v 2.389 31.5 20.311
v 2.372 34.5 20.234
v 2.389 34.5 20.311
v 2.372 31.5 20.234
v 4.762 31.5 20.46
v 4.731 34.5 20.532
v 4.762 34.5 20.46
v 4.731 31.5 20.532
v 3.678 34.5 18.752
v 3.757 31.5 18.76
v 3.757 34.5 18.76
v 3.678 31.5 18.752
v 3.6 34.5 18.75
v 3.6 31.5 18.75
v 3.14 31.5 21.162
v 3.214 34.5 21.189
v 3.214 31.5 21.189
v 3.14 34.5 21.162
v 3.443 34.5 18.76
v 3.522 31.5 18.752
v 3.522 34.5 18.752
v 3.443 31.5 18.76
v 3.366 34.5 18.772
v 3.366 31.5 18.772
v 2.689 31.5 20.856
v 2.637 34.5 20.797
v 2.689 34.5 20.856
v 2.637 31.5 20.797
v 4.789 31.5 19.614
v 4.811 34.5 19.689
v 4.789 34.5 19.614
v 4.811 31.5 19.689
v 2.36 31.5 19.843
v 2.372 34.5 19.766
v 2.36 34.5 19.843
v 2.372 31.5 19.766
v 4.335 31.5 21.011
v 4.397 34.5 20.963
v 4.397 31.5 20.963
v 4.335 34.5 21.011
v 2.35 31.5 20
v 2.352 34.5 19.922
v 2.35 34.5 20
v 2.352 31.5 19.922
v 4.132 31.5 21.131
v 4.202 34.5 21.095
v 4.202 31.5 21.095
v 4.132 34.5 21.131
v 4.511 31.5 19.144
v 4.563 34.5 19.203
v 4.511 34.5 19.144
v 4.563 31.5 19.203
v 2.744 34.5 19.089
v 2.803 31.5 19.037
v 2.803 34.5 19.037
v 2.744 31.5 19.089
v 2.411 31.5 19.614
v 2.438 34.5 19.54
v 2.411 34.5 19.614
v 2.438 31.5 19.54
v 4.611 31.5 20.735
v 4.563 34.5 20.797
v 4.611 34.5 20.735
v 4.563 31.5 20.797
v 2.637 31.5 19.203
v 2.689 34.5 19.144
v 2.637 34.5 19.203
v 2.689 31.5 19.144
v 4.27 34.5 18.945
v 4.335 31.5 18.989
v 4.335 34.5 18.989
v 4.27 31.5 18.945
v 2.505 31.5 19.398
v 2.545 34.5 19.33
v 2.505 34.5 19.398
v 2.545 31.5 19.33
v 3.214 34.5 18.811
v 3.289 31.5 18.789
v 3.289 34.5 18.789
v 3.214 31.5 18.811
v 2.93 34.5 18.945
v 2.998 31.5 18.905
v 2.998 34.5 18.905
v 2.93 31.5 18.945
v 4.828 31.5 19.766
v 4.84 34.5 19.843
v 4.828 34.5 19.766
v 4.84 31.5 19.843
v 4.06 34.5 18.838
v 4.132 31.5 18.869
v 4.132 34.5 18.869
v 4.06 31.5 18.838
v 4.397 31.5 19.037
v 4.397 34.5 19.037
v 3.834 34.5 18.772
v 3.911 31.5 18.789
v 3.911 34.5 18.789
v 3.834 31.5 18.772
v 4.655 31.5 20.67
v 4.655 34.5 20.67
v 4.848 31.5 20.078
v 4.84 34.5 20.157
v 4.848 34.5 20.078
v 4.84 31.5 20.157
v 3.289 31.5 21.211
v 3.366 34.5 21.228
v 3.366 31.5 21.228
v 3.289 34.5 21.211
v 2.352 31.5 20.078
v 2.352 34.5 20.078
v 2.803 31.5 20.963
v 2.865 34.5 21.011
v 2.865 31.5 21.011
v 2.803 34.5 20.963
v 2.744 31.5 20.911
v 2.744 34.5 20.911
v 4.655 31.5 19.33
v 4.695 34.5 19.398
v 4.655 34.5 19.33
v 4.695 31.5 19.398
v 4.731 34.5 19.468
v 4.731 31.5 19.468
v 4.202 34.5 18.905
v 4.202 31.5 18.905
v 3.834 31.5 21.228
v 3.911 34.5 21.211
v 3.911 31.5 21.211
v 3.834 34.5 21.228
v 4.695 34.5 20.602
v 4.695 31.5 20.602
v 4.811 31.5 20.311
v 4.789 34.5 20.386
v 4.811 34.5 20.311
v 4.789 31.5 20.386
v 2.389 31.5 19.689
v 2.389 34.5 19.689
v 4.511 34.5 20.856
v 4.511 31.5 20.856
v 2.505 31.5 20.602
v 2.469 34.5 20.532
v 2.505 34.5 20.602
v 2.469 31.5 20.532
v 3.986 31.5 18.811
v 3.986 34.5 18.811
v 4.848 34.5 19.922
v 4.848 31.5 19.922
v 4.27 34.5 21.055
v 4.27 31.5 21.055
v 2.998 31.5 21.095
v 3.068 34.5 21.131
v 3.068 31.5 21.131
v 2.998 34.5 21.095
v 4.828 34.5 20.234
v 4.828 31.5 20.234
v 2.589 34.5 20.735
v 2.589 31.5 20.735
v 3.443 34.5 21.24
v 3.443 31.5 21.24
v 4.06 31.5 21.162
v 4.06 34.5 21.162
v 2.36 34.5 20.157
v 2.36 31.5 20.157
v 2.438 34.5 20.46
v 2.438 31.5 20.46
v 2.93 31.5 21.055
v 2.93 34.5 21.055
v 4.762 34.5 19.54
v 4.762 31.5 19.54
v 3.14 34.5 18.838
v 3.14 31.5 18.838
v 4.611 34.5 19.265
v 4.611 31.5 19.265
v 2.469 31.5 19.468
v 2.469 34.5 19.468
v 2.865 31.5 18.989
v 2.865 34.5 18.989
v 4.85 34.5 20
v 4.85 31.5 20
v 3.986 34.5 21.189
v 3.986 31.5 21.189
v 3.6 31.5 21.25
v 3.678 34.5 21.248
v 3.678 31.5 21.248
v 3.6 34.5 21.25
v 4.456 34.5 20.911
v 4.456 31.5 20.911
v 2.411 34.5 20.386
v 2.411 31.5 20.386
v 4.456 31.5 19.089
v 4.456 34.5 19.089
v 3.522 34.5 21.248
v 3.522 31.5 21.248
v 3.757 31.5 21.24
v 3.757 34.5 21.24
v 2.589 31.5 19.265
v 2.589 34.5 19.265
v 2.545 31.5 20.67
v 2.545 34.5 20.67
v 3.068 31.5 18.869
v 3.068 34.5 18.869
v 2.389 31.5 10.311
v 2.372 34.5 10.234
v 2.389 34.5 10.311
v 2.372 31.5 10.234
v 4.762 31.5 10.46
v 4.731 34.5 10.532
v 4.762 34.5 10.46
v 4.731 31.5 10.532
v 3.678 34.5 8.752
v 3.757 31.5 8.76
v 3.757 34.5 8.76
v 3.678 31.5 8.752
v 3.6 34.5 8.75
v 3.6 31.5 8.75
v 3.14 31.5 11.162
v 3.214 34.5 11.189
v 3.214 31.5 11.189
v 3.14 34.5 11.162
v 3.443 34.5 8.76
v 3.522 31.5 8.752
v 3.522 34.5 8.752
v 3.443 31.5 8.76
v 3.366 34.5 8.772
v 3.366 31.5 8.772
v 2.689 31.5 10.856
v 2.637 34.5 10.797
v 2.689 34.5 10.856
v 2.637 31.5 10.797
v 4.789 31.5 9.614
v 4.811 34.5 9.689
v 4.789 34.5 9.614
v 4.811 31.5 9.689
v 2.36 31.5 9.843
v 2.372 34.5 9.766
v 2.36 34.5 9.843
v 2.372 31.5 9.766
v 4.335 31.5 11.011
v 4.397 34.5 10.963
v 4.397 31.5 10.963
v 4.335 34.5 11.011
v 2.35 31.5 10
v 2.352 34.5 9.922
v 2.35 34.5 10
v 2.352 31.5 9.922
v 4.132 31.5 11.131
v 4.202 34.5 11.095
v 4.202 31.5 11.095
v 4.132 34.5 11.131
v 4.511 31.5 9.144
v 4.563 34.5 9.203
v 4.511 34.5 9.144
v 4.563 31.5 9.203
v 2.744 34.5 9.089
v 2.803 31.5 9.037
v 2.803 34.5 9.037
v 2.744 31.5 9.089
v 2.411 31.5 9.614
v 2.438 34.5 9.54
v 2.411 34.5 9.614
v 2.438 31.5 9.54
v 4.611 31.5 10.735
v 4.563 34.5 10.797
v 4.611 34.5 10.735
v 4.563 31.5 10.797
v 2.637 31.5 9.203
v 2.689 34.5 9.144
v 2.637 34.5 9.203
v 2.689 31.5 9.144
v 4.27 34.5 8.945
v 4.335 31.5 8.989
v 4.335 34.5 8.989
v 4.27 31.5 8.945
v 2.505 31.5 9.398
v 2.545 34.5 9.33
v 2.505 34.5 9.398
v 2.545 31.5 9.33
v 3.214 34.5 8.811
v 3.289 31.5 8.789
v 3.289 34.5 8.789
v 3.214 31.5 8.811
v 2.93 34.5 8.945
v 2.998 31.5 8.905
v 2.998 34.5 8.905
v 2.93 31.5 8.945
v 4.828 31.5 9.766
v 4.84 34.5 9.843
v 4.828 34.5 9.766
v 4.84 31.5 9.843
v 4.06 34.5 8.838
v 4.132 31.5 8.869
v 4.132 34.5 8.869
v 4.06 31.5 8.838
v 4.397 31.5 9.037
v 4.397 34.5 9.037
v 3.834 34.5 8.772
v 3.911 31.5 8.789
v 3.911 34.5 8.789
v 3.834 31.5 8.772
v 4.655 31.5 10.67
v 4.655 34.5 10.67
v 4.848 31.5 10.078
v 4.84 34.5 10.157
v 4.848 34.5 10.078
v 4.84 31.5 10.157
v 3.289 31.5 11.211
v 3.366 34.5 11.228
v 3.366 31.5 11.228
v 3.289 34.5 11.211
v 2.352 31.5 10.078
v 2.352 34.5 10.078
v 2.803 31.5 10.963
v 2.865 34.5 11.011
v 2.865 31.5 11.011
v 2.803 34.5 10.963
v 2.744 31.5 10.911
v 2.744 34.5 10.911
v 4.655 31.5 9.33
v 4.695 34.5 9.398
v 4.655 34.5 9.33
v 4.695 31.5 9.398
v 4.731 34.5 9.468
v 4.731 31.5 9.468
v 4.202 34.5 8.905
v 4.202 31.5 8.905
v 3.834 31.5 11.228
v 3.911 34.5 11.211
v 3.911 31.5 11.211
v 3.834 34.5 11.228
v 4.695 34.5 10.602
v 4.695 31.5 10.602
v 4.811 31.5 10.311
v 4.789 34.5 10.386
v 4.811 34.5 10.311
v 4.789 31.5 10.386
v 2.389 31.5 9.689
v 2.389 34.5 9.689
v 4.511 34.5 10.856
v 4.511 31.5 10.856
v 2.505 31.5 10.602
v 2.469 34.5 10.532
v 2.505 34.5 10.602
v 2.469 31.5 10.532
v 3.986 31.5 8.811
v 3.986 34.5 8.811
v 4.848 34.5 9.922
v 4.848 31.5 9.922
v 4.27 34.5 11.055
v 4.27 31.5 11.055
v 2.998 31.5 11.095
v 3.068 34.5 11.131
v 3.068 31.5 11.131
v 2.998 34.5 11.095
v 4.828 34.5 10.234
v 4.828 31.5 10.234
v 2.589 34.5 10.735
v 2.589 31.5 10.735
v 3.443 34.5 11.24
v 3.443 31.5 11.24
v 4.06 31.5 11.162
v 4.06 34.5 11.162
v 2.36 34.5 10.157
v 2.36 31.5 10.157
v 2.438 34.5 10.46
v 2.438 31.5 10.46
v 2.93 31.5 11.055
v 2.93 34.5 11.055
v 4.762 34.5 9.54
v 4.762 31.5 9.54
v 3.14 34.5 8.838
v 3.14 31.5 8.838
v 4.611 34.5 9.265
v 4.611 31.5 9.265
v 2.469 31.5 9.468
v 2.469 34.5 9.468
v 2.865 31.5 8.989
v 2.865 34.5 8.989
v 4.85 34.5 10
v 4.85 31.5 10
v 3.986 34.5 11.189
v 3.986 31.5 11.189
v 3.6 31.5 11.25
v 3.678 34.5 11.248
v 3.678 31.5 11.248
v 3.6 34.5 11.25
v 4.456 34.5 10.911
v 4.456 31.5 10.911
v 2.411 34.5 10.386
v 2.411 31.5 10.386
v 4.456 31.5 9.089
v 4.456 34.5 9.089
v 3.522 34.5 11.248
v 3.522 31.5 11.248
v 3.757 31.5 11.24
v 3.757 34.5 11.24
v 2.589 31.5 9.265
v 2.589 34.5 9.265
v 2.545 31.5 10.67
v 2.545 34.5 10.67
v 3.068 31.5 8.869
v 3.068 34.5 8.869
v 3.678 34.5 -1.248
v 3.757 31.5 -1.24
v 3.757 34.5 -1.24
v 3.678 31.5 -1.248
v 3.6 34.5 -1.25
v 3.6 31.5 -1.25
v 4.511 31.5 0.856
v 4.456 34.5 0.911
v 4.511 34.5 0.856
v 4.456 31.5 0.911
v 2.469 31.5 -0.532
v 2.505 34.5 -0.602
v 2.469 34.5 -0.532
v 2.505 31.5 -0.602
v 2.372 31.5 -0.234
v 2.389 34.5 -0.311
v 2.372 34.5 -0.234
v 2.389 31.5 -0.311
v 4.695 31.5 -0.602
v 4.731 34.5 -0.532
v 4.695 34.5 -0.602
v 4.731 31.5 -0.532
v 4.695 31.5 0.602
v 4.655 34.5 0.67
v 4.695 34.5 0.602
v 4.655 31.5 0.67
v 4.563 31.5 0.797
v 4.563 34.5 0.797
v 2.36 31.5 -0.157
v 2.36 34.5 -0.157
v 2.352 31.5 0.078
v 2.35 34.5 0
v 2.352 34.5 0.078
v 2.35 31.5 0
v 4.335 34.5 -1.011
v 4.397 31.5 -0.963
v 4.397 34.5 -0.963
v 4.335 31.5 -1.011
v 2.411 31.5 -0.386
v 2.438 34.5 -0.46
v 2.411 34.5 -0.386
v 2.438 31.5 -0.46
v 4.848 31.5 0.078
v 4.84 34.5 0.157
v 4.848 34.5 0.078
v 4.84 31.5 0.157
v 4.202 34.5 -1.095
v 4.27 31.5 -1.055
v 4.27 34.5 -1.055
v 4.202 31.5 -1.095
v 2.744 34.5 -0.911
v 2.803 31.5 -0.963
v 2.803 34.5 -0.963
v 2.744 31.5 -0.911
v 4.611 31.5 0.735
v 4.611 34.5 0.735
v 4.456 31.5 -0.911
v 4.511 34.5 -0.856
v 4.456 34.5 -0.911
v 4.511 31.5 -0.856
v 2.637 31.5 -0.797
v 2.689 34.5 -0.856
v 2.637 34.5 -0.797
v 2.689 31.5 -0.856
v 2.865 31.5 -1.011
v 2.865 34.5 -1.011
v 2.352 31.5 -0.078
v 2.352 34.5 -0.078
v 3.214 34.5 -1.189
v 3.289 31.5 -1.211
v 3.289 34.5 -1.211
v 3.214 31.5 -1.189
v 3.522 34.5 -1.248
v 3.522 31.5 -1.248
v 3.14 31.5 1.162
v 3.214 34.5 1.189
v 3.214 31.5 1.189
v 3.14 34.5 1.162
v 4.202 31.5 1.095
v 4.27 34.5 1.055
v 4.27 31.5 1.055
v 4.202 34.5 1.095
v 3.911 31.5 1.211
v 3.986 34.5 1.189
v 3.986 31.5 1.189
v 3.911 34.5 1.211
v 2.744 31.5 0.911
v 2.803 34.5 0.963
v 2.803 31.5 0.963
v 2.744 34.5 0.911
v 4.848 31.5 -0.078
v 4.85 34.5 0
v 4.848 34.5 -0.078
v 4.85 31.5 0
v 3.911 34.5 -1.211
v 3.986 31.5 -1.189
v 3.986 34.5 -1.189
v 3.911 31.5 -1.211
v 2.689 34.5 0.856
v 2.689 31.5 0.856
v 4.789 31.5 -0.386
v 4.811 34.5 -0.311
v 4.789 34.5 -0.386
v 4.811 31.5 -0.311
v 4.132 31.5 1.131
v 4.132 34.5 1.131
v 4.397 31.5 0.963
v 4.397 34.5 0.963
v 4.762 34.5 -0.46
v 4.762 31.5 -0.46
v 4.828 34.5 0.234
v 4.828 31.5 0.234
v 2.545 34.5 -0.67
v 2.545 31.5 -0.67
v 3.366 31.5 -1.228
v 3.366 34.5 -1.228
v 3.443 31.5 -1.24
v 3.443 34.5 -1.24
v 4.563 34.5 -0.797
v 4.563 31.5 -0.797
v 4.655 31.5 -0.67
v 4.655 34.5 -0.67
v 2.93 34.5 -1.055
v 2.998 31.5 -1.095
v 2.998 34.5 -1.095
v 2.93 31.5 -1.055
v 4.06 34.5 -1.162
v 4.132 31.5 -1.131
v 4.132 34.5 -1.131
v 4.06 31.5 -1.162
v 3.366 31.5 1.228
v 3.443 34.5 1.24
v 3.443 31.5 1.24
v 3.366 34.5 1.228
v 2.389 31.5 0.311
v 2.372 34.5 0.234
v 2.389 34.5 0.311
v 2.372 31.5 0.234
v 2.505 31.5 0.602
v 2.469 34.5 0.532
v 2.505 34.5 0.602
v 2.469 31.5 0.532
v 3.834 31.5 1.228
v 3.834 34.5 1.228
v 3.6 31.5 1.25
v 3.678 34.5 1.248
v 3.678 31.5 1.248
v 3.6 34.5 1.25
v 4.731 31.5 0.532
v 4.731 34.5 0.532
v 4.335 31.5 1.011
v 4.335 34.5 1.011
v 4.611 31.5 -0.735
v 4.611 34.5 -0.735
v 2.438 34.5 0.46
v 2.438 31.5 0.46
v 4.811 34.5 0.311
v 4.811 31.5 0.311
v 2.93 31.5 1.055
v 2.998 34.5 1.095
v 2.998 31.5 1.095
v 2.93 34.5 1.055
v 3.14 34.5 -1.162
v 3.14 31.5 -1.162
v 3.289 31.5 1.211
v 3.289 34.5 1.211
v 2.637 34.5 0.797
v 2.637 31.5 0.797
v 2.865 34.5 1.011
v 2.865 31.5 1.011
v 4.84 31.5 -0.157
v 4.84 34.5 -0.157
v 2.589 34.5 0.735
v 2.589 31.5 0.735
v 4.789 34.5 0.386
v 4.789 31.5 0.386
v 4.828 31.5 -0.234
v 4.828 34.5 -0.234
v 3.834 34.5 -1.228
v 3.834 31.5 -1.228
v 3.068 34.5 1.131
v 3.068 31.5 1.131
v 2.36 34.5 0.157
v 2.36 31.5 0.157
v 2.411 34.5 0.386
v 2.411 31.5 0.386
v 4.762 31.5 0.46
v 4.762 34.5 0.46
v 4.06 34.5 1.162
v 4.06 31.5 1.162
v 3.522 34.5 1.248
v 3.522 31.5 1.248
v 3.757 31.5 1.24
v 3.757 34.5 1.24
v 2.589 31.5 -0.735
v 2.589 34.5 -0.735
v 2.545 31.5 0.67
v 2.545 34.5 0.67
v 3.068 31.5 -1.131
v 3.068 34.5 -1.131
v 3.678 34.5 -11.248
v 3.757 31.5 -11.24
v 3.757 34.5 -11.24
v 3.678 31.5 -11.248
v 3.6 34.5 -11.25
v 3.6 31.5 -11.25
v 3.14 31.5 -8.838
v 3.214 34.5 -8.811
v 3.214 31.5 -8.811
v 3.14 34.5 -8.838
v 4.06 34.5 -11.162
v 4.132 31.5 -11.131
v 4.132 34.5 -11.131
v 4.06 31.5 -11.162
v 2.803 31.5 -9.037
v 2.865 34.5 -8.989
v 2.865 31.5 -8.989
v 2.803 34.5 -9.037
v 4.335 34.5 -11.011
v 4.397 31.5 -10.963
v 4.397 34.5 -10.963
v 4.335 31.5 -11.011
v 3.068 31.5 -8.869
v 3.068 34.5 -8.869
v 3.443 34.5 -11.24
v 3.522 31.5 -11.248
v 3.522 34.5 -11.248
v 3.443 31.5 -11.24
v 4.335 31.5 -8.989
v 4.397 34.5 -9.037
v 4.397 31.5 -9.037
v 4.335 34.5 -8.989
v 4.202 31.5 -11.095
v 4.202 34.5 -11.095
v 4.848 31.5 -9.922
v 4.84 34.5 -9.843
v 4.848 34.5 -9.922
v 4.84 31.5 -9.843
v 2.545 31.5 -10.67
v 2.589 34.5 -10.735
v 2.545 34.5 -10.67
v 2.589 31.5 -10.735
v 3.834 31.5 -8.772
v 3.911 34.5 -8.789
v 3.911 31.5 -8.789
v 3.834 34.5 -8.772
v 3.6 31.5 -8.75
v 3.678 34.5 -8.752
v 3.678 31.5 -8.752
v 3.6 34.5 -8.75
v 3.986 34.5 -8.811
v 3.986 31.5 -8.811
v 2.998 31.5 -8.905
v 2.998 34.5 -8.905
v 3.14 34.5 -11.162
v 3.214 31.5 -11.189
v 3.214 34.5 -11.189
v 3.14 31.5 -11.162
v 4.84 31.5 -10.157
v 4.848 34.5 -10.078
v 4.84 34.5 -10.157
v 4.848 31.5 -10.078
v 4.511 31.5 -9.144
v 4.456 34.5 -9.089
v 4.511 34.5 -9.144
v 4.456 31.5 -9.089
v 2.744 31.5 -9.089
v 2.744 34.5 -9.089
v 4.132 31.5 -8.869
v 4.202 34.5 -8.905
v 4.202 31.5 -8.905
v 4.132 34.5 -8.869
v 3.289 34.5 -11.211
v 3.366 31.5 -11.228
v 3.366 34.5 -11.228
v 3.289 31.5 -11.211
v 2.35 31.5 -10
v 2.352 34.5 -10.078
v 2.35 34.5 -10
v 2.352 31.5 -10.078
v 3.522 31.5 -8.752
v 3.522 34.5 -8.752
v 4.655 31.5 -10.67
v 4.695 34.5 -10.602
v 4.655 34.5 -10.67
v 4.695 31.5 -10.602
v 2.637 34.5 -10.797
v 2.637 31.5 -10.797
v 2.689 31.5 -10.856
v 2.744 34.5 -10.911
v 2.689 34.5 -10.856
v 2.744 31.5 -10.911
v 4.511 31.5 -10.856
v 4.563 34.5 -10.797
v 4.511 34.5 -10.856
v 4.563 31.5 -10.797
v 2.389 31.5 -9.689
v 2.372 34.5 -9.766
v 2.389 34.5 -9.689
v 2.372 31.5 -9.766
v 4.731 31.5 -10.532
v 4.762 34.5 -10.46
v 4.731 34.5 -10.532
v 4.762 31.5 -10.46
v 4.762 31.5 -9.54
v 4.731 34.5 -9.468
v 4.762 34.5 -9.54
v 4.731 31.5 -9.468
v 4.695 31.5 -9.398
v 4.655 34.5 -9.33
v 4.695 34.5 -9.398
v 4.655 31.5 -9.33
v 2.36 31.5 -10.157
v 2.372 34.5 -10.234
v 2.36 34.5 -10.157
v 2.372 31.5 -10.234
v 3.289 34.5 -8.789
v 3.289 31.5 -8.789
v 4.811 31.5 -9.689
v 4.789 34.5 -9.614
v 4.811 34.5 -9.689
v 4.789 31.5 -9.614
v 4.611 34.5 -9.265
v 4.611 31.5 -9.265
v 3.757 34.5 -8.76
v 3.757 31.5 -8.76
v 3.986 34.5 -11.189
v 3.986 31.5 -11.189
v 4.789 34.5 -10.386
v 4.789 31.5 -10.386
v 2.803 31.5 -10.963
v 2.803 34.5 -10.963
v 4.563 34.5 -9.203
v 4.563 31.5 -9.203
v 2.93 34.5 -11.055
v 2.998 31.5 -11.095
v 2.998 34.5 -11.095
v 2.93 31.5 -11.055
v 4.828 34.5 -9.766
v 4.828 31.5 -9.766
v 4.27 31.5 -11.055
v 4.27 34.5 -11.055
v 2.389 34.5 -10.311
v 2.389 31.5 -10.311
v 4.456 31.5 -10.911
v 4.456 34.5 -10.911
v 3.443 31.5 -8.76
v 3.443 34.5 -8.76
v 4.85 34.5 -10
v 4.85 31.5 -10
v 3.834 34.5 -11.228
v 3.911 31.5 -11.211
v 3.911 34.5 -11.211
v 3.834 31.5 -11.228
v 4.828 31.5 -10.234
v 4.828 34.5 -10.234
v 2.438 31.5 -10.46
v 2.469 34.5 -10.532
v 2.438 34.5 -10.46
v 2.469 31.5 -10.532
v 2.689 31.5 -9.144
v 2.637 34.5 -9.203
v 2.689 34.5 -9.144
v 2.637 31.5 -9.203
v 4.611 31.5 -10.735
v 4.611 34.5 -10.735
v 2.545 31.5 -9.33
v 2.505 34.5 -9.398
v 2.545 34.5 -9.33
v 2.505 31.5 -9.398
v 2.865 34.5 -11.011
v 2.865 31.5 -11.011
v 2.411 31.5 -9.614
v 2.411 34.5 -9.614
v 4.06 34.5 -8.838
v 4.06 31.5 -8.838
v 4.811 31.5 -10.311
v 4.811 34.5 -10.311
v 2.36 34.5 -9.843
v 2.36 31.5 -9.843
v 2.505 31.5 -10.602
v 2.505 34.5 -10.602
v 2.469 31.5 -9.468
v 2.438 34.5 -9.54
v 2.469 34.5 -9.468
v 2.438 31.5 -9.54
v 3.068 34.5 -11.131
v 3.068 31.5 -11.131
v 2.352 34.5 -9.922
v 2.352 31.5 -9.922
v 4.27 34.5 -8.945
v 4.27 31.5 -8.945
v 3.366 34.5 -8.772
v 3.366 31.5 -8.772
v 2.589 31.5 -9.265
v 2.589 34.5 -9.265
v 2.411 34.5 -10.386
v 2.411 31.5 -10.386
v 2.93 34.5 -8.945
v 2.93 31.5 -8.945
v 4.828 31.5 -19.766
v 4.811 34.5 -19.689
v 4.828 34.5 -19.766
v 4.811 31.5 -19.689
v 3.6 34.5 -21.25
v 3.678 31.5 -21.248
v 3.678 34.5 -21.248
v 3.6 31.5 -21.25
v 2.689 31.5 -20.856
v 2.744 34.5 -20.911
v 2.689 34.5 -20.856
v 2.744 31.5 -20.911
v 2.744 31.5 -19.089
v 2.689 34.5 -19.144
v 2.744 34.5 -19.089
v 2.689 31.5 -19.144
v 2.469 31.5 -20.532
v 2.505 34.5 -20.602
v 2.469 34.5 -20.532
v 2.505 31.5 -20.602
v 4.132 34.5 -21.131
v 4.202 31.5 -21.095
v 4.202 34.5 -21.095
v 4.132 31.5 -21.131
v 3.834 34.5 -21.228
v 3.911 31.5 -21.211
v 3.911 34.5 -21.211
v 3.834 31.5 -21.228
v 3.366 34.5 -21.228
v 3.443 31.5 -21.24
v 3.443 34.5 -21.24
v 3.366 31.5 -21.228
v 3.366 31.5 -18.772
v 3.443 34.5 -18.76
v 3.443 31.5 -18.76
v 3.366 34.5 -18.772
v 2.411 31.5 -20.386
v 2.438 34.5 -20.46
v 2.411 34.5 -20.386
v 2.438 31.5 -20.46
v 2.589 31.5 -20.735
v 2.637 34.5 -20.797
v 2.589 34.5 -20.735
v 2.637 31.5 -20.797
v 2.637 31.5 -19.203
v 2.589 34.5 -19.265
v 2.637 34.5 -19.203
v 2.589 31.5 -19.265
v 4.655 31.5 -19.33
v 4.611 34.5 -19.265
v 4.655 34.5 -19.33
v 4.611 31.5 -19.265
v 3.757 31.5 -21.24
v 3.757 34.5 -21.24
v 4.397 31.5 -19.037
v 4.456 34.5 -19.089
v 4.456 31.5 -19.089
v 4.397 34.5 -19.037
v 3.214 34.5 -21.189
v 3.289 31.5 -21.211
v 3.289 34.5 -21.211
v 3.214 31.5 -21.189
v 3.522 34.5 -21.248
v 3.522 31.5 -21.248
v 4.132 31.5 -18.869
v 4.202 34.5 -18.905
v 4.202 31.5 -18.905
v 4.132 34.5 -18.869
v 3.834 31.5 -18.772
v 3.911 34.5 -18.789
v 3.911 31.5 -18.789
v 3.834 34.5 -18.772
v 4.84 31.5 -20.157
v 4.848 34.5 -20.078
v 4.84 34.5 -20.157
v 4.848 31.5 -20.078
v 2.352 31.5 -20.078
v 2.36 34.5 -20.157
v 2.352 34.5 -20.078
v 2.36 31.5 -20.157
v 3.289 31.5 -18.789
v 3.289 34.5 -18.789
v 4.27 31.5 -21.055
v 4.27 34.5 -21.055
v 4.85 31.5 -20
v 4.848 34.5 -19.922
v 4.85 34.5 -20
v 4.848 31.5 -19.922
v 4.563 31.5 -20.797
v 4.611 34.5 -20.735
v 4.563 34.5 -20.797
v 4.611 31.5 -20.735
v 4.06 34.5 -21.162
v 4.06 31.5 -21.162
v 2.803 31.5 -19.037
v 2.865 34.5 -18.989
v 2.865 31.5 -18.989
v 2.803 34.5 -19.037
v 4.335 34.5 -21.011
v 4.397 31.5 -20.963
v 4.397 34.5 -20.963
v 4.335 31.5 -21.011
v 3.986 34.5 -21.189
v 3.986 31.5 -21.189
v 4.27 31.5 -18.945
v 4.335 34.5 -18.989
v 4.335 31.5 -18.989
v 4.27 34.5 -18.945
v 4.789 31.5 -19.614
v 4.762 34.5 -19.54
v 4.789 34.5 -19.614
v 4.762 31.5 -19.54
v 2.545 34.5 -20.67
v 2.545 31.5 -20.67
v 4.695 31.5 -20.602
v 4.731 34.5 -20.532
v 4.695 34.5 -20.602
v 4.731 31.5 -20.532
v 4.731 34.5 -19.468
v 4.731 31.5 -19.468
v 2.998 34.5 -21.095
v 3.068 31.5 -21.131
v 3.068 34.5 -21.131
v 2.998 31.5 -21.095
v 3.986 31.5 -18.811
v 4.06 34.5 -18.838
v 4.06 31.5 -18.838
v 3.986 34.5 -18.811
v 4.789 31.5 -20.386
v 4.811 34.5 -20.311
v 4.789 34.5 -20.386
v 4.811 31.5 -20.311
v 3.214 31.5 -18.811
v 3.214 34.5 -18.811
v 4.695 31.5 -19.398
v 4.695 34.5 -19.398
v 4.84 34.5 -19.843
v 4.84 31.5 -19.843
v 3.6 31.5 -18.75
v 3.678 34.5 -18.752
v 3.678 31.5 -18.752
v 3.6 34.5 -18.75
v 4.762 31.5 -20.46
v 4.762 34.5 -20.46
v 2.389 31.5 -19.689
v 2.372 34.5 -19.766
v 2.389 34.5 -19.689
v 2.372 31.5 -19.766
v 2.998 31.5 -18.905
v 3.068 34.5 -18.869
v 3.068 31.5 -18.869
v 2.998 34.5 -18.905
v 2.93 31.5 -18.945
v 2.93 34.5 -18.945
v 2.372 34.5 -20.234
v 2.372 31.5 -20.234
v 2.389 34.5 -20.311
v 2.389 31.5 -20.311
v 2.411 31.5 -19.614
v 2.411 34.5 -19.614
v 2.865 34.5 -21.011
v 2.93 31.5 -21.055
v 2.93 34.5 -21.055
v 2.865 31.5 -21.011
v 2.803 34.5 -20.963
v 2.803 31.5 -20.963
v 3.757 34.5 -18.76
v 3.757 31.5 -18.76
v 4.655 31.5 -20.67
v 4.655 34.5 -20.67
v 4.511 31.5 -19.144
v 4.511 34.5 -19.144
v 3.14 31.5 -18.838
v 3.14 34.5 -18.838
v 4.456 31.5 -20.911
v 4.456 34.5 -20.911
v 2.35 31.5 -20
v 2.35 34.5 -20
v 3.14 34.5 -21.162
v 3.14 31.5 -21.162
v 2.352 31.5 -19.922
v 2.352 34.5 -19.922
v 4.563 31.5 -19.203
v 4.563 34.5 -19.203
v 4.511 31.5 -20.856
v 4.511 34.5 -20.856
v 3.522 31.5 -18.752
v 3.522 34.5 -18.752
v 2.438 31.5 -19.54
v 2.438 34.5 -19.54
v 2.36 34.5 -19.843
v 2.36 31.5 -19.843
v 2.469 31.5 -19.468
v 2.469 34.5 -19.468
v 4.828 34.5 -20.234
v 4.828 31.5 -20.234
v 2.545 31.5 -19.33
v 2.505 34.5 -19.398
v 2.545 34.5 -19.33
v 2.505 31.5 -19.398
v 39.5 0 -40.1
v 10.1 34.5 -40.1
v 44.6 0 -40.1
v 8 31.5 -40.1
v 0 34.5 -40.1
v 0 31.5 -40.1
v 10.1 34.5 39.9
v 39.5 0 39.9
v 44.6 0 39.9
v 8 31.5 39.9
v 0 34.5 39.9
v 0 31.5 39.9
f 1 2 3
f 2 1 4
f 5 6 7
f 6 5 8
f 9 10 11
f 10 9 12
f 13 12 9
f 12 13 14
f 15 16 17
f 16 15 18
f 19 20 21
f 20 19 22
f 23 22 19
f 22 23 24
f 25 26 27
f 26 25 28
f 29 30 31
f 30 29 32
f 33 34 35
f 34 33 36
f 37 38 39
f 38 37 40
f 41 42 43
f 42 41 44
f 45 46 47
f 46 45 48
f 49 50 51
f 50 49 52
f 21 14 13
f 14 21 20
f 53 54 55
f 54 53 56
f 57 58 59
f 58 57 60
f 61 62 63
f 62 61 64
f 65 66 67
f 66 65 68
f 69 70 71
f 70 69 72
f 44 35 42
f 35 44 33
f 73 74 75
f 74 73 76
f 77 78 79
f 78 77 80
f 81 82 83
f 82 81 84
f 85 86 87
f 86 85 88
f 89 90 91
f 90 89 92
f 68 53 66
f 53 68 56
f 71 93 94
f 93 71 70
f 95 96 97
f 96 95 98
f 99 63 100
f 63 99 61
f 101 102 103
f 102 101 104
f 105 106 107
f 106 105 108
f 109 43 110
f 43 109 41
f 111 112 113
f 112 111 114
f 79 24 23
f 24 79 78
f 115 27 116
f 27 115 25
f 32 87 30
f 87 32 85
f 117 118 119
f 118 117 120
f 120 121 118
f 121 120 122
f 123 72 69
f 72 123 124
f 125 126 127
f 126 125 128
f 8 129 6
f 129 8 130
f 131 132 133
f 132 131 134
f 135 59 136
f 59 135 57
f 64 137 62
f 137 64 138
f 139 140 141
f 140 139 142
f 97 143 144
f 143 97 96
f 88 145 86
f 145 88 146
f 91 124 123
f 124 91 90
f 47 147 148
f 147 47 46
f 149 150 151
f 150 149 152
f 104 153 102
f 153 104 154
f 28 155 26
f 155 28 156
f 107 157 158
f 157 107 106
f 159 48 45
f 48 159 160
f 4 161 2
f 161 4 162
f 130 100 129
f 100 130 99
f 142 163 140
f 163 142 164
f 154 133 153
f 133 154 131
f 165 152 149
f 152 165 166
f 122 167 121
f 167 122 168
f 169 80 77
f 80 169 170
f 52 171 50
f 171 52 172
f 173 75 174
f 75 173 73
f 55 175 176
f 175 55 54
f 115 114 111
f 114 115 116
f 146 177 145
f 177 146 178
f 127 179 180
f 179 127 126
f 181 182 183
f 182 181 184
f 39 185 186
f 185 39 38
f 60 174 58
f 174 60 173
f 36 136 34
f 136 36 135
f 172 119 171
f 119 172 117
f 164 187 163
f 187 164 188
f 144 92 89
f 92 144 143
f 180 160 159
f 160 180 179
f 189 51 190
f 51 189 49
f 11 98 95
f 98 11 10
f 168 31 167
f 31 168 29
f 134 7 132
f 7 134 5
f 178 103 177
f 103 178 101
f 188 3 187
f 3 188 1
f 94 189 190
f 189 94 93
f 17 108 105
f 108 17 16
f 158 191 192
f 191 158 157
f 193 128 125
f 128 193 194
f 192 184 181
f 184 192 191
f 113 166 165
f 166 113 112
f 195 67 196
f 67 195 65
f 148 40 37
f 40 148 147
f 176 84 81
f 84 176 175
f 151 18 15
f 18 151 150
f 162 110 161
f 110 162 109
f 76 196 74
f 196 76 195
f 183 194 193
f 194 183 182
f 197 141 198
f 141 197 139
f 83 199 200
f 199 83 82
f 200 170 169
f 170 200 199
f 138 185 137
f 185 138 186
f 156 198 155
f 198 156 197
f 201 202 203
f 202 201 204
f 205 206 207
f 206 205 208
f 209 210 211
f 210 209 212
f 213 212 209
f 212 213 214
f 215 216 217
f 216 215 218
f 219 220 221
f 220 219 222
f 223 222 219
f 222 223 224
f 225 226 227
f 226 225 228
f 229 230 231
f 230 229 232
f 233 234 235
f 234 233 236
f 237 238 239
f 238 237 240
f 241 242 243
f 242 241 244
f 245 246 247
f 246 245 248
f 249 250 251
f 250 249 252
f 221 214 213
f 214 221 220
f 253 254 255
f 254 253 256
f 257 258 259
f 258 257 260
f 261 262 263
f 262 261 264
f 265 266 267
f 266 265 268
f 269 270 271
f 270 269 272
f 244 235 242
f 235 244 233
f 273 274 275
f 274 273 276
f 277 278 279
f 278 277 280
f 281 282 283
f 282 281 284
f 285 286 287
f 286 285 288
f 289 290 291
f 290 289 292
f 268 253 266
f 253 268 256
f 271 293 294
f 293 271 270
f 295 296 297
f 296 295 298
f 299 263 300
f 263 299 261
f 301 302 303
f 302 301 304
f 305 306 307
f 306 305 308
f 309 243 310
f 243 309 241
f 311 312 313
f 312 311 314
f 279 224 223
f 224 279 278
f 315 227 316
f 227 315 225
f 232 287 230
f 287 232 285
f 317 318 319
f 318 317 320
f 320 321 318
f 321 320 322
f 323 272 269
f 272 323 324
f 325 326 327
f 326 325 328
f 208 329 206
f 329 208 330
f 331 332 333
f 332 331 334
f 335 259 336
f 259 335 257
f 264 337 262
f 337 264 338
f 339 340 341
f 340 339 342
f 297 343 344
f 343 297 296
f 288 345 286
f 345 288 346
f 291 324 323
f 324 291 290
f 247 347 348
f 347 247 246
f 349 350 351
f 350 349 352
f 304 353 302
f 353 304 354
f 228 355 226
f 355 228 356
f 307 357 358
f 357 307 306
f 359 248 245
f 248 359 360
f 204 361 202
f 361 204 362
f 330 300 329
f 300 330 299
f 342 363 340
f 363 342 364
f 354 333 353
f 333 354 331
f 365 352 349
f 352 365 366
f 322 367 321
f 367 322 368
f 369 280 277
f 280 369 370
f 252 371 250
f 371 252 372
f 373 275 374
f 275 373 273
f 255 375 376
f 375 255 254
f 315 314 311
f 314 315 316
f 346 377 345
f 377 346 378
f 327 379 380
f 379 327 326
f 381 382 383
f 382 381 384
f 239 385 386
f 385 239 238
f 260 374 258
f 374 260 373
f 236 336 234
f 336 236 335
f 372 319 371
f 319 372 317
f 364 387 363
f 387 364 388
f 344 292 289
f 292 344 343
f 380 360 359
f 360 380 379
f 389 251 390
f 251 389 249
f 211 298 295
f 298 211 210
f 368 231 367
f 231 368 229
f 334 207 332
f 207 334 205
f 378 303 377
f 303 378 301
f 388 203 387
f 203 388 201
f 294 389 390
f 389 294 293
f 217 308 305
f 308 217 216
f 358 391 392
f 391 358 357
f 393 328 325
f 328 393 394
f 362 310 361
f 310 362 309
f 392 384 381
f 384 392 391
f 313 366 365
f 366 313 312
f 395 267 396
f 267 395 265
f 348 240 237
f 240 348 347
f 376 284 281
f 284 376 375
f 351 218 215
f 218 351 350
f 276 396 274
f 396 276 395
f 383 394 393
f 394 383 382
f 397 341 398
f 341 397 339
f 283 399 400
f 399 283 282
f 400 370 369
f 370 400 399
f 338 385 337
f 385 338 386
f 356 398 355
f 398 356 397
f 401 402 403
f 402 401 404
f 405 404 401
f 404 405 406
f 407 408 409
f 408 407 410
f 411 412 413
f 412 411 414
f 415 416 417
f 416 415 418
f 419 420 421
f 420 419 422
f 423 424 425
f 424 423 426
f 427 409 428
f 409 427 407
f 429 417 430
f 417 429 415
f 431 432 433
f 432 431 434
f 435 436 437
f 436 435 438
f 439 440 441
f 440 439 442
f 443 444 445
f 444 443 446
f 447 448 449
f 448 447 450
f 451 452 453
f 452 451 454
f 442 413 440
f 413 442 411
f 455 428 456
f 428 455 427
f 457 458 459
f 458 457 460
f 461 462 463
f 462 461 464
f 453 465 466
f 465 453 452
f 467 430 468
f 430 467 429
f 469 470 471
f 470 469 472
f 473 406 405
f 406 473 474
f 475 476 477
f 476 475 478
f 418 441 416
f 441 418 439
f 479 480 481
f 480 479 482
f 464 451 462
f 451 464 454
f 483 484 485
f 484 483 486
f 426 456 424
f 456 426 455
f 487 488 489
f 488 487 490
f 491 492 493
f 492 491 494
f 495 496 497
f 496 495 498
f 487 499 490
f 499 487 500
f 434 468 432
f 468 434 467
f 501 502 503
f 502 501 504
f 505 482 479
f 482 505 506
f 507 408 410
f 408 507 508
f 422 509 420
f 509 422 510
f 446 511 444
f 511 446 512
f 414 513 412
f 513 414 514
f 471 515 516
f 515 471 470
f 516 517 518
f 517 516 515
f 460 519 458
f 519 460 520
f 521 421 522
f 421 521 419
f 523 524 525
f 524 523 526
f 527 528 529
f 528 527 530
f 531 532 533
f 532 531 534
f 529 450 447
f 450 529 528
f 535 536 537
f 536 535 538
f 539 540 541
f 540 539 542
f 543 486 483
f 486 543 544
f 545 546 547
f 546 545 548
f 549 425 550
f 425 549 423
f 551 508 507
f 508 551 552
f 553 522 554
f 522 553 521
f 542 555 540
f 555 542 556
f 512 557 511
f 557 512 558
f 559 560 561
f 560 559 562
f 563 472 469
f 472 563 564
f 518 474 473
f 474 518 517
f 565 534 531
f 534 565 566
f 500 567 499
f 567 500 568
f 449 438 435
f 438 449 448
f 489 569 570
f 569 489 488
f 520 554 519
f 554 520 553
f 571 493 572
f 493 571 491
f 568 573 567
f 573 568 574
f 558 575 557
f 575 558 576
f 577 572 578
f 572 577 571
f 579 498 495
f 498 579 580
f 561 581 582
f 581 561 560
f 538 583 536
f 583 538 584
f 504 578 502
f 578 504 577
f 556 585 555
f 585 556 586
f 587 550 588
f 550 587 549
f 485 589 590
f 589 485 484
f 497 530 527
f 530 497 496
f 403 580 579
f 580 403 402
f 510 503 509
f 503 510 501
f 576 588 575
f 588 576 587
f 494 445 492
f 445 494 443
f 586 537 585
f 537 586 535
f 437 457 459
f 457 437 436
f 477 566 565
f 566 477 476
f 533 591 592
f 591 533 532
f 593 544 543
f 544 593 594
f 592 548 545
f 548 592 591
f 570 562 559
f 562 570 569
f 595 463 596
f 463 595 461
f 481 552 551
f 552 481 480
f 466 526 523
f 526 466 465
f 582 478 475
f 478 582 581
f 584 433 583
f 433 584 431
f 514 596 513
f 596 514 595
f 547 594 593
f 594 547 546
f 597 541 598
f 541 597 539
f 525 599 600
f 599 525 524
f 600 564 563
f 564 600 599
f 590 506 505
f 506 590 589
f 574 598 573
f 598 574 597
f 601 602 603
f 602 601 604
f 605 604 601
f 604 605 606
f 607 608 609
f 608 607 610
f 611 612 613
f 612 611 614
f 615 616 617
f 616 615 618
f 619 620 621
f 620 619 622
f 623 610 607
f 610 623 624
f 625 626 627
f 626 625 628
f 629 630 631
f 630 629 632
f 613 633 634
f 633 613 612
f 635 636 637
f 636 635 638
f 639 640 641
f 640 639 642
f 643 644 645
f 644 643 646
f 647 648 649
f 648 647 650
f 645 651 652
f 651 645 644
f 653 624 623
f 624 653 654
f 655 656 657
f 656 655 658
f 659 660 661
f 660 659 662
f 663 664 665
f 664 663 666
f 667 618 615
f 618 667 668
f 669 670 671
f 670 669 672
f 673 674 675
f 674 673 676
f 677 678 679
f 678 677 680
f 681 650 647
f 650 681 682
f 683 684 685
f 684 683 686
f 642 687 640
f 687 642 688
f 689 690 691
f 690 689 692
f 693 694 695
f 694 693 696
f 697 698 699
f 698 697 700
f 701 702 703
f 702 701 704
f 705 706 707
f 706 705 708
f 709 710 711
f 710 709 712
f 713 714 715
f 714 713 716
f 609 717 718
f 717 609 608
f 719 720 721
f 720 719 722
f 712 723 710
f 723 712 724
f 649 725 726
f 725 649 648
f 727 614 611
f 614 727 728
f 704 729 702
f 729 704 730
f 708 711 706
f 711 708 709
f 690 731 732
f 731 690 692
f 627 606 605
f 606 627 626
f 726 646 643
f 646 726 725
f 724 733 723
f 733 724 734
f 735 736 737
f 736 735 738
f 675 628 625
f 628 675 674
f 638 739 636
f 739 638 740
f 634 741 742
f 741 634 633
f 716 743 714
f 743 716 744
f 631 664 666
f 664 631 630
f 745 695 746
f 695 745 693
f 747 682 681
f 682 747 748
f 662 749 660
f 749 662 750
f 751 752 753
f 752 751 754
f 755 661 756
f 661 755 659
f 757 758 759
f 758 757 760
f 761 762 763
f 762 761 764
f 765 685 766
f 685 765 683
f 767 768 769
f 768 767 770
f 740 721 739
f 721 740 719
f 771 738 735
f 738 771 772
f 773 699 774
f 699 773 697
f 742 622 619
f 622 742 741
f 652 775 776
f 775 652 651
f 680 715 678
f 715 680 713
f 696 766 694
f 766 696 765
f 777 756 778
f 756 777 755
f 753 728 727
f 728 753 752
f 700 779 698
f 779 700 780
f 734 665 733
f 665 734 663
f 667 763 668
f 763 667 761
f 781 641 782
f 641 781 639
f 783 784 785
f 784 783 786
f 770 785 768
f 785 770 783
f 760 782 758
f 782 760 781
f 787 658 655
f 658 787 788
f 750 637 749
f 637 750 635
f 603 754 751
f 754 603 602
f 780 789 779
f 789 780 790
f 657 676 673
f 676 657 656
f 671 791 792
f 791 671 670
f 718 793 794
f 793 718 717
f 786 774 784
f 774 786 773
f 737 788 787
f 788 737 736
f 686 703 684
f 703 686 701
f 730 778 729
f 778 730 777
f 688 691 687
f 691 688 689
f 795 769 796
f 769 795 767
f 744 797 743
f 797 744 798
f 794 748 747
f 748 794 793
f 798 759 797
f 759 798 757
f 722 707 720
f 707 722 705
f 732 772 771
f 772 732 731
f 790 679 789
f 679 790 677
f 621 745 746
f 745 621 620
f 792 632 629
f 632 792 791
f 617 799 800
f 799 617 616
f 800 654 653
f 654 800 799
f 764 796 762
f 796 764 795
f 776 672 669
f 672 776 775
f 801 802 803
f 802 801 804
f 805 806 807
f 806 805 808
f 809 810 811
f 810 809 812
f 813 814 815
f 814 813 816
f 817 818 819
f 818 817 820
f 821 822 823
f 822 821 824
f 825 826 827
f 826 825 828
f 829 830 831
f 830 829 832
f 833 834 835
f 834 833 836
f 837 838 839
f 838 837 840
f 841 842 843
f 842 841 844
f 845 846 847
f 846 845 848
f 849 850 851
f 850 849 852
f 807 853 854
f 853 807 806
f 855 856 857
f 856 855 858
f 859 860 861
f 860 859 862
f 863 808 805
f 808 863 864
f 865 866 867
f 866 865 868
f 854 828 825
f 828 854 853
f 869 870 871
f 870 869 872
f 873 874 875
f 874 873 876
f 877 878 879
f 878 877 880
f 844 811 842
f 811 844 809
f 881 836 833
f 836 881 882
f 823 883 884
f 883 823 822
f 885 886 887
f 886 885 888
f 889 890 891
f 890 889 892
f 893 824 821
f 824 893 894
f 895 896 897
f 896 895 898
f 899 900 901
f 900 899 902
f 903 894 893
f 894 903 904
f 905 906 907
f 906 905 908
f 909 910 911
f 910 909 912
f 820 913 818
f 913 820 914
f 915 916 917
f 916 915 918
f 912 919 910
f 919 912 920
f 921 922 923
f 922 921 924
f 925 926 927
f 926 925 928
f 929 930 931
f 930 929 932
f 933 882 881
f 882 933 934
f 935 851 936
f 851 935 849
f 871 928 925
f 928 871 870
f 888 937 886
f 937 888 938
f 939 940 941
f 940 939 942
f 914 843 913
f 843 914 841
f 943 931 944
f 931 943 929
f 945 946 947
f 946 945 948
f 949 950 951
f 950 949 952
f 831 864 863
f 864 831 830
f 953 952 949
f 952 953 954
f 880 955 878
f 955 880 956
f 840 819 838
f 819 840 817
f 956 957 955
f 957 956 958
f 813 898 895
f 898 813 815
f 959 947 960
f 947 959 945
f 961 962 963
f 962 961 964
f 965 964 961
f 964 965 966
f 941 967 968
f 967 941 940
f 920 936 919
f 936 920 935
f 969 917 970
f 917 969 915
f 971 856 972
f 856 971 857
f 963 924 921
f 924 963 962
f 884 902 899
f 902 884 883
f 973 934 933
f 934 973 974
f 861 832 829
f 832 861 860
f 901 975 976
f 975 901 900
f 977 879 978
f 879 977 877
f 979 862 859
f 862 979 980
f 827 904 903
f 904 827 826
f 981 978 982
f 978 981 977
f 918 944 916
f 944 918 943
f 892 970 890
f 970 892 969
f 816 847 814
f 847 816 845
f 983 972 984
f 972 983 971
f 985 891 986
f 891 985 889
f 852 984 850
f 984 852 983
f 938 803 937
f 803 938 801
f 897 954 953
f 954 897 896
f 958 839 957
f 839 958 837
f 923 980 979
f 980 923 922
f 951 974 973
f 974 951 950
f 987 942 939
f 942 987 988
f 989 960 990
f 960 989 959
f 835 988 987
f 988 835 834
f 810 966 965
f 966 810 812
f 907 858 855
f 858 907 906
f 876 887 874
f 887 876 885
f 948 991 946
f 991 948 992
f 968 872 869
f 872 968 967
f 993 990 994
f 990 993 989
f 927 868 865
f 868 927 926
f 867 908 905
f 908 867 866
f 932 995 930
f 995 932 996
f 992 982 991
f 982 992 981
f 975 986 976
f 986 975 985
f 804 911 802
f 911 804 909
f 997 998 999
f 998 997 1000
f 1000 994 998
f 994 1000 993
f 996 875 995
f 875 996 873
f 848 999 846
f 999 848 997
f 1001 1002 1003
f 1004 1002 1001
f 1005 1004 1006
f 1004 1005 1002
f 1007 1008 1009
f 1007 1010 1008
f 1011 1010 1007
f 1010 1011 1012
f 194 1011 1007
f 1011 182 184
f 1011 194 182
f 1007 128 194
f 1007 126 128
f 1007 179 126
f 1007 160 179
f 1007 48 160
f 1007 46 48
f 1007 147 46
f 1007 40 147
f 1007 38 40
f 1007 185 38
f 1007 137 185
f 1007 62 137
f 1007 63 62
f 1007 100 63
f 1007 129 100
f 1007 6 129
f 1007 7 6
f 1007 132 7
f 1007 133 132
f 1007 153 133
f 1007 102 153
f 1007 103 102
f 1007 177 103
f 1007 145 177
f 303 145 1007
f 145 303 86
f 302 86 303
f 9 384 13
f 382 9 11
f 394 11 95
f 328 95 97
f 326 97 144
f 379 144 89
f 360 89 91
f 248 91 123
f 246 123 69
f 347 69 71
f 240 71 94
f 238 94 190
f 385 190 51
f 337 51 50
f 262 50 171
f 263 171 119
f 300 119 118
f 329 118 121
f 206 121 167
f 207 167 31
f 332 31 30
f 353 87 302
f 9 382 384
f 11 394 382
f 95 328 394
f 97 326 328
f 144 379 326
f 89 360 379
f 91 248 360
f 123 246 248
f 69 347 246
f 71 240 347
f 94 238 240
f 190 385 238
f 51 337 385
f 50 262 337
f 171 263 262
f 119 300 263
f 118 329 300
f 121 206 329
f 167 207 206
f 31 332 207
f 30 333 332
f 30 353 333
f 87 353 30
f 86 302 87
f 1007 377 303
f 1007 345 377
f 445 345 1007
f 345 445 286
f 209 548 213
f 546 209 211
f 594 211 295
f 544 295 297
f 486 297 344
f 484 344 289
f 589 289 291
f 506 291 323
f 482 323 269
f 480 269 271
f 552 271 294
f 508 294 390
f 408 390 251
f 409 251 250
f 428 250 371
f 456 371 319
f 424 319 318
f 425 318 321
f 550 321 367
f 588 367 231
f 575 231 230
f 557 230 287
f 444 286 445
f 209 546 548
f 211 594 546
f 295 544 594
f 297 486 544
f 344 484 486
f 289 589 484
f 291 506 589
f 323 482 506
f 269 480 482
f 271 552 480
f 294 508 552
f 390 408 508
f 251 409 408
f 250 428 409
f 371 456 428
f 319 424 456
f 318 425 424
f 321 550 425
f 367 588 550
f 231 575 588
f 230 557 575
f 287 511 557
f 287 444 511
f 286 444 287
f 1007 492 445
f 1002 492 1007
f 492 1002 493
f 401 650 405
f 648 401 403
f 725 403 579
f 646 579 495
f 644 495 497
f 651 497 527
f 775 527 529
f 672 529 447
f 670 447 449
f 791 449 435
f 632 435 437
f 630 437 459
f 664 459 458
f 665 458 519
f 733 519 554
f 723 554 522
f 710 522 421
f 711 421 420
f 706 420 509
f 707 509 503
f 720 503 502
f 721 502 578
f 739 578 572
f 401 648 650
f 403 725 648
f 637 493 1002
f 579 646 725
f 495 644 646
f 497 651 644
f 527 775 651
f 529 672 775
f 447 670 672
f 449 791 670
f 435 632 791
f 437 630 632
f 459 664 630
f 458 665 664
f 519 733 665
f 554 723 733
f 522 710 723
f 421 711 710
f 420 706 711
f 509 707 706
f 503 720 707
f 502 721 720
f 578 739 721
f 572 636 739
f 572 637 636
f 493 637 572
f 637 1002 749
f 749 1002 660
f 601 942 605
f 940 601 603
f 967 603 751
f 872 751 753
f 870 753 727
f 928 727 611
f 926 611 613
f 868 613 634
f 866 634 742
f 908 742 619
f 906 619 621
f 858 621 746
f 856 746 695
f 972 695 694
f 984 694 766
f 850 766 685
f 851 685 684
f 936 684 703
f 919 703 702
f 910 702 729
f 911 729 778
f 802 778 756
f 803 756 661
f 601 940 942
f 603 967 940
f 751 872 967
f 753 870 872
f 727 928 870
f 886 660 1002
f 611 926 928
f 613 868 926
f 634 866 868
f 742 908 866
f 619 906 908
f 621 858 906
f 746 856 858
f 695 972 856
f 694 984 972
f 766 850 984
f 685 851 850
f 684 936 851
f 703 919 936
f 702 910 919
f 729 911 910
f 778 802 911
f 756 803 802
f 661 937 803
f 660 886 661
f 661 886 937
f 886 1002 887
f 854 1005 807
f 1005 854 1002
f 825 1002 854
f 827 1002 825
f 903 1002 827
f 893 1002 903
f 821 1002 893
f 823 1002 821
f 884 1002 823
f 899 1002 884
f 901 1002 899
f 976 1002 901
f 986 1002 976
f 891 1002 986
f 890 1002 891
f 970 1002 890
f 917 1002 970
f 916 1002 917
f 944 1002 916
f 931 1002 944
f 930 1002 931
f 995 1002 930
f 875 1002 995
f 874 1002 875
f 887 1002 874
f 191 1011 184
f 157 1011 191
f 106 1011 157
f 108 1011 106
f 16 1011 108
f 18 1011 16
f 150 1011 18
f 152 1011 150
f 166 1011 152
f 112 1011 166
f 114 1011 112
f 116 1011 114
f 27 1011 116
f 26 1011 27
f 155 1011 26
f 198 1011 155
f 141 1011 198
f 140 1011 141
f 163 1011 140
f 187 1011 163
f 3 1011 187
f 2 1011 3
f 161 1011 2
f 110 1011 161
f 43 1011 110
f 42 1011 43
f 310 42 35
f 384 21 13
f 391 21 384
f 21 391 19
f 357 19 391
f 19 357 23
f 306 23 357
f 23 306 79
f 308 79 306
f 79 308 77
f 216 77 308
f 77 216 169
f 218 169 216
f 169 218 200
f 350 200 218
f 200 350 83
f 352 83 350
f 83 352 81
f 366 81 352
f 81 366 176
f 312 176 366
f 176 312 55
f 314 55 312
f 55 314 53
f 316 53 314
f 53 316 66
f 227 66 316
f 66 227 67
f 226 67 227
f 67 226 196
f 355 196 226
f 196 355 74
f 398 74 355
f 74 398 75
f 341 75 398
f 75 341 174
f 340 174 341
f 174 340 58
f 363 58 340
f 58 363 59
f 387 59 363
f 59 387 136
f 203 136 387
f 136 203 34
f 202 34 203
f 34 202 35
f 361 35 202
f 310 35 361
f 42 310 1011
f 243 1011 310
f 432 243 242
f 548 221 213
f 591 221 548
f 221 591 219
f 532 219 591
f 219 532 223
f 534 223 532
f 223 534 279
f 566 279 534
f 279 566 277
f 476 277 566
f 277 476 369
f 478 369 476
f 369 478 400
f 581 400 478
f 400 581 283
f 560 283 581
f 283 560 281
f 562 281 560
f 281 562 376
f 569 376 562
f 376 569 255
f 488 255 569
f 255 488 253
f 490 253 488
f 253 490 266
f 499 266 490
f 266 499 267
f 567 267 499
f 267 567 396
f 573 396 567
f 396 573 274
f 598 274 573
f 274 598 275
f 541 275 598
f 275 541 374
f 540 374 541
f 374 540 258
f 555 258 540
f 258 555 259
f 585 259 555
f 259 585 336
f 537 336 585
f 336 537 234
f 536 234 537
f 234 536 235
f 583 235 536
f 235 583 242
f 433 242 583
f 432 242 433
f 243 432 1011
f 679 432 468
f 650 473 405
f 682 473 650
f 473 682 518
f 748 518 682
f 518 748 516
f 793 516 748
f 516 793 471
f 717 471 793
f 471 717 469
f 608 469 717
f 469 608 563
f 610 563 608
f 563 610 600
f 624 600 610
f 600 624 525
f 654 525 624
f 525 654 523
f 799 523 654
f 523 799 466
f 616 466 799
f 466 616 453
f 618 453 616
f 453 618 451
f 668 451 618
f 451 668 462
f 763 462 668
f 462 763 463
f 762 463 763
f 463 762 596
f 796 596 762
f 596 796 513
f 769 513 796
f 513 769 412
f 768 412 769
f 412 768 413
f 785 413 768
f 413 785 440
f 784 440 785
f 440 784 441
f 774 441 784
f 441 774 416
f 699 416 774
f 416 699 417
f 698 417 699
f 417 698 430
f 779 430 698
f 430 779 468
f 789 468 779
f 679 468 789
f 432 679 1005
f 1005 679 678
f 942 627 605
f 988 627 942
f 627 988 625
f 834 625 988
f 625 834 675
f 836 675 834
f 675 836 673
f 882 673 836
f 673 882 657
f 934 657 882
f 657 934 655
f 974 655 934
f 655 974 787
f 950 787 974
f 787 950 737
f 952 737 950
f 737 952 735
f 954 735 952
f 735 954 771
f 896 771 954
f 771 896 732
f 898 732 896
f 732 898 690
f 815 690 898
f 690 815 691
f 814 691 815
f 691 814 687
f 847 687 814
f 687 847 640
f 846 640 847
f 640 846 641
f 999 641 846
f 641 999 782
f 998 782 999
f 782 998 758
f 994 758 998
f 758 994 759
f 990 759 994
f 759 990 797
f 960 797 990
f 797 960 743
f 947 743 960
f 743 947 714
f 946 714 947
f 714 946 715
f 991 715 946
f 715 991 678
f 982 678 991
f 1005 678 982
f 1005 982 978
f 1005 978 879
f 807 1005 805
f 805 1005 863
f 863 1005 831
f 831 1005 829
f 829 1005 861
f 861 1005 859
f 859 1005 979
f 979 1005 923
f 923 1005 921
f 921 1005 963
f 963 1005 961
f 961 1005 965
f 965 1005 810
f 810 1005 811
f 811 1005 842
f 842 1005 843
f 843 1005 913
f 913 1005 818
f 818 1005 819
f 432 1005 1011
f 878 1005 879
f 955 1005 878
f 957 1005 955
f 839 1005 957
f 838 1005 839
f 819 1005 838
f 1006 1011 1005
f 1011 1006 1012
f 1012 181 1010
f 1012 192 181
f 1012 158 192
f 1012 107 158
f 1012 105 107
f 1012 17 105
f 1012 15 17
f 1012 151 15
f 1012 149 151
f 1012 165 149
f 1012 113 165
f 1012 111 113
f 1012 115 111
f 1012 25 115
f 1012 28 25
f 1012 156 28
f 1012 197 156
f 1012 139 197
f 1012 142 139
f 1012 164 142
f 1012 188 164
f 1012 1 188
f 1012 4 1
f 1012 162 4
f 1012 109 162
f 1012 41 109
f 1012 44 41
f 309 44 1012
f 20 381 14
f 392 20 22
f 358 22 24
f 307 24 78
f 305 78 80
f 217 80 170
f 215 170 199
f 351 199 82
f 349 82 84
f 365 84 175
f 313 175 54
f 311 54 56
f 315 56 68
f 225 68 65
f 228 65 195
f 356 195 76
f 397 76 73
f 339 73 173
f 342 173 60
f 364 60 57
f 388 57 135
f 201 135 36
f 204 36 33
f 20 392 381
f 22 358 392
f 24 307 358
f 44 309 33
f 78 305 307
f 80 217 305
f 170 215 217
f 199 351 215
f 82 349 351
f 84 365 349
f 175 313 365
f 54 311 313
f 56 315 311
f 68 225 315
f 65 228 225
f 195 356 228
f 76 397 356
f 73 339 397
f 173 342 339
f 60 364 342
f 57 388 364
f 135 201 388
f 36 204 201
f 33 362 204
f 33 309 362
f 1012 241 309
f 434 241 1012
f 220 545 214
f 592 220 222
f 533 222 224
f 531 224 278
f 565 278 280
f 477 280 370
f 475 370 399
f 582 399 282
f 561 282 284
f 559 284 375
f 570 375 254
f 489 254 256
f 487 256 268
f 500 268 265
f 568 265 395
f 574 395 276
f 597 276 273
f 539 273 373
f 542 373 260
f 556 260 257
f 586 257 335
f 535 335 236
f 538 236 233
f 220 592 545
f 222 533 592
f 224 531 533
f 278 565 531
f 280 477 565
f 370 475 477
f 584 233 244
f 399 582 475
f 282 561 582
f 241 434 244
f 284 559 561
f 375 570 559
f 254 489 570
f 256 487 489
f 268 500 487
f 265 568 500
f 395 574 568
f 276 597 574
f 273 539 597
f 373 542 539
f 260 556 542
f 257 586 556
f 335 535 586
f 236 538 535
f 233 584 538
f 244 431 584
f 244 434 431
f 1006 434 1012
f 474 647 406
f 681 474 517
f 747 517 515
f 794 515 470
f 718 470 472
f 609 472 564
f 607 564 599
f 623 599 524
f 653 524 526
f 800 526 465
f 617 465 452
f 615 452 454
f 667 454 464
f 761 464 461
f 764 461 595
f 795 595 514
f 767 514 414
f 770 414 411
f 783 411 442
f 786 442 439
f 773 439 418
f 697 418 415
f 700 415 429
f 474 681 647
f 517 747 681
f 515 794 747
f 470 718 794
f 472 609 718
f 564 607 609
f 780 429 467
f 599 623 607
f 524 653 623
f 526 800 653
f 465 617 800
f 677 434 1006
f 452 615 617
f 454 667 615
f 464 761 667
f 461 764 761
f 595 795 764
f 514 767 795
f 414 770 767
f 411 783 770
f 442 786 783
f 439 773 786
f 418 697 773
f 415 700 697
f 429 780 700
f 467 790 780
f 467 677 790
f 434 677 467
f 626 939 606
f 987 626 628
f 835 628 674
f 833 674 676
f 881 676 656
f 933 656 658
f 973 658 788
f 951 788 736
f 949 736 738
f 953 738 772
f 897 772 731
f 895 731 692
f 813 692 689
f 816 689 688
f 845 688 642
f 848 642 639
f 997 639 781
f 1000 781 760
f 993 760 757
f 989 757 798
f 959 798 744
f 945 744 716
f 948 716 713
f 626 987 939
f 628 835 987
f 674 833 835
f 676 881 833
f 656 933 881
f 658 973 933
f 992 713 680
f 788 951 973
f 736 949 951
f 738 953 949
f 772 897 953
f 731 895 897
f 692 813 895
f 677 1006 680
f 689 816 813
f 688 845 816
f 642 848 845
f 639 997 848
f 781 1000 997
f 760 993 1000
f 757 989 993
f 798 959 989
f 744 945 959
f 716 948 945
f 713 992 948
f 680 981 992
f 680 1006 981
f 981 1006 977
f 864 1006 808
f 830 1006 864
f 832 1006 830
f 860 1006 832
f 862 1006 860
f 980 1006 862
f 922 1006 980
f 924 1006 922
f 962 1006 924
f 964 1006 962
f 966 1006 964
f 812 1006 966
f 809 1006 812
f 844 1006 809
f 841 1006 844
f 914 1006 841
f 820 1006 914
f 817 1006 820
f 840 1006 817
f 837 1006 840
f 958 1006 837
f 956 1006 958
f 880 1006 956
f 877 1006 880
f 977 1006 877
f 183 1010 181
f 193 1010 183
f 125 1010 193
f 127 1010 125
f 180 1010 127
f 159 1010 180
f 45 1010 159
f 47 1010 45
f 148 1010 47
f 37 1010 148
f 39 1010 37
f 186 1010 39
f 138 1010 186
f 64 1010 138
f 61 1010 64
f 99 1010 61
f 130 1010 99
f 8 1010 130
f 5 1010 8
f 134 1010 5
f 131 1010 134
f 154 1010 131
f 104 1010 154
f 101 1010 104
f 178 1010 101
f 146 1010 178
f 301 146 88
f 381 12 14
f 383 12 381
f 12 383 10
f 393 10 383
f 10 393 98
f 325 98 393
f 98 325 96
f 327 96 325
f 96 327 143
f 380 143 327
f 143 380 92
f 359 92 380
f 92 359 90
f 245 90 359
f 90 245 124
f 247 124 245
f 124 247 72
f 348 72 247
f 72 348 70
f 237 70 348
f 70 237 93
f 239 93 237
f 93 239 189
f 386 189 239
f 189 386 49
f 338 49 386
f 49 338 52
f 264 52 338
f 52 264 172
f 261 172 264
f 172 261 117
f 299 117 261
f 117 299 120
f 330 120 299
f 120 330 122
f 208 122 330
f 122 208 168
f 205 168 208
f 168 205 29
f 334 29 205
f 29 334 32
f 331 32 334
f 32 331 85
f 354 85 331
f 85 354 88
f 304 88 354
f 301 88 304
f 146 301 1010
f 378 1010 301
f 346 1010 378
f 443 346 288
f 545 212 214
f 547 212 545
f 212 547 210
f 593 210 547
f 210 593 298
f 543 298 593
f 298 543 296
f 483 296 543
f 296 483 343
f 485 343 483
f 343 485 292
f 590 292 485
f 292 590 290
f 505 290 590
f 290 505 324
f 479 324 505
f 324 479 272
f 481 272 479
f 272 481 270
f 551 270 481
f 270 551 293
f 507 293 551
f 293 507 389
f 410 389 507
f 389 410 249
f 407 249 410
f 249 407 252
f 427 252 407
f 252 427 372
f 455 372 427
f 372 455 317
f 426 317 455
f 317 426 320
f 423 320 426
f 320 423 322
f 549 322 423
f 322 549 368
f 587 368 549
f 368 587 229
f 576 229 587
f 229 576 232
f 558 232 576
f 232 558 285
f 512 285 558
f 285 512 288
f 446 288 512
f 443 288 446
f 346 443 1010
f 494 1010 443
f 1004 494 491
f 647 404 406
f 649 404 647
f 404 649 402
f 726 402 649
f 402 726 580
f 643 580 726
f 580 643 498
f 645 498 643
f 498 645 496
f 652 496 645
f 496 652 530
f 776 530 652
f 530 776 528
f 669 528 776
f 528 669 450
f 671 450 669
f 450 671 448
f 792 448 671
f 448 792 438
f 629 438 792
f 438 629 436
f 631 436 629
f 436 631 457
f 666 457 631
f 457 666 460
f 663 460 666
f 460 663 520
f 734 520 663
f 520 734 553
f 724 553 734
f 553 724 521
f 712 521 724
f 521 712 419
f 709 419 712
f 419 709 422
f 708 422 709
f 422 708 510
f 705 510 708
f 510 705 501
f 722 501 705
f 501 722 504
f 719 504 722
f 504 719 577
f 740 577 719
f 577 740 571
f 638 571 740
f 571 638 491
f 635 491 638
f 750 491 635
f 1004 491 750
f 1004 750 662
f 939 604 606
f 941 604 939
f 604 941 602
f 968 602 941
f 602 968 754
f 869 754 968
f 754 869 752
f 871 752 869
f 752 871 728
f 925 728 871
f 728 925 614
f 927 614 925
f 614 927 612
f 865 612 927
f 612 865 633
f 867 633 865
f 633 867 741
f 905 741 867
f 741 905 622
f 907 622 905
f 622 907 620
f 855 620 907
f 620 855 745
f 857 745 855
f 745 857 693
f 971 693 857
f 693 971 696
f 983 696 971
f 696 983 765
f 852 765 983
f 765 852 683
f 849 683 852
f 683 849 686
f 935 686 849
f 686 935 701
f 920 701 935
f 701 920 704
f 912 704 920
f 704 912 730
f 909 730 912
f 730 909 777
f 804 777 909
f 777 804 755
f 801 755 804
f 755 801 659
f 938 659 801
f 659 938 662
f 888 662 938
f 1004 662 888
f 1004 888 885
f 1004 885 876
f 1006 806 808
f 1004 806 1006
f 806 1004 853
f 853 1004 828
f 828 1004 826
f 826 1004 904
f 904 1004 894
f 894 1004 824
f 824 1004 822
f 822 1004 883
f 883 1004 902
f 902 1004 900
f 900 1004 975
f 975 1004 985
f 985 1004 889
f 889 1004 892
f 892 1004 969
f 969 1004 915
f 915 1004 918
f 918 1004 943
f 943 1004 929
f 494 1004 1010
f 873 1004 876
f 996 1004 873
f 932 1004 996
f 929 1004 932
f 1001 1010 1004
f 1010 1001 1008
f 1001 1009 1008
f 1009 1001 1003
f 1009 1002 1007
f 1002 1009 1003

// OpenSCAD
$fn=100;

// All dimensions in mm

Rise = 31.5;
MountWidth = 8; // from 0.1 * PlateLength in PlainBase.scad
Thickness = 3; // make the scoop a little thicker
ContactWidth = 0.7 * Thickness; // width of the scoop's shoe

ScoopLength = 80; // would really like 160, but the printer won't do it.

epsilon = 0.1; // little bit more to provide overlap

AccHoleSpace = 10; // from Plainbase.scad
HoleDia = 2.5; 

module AccessoryHoles()
{
  union() {
    for(idx = [-2:2]) {
      translate([idx * AccHoleSpace, 0, 0]) cylinder(d = HoleDia, h = Thickness * 2);
    }
  }
}

module Scoop() {
difference() {
  translate([0, 0, -(0.5 * ScoopLength + epsilon)])
    linear_extrude(height = ScoopLength)
      polygon(points = [ [0, Rise], [0, Rise + Thickness],
                         [MountWidth + ContactWidth, Rise + Thickness],
			 [MountWidth + ContactWidth + Rise + Thickness, 0],
			 [MountWidth + Rise, 0],
			 [MountWidth, Rise],
			 [0, Rise] ]);
  translate([0.45 * MountWidth, Rise + 1.5 * Thickness, 0]) rotate([90, 90, 0]) AccessoryHoles();    
}
}

Scoop();
